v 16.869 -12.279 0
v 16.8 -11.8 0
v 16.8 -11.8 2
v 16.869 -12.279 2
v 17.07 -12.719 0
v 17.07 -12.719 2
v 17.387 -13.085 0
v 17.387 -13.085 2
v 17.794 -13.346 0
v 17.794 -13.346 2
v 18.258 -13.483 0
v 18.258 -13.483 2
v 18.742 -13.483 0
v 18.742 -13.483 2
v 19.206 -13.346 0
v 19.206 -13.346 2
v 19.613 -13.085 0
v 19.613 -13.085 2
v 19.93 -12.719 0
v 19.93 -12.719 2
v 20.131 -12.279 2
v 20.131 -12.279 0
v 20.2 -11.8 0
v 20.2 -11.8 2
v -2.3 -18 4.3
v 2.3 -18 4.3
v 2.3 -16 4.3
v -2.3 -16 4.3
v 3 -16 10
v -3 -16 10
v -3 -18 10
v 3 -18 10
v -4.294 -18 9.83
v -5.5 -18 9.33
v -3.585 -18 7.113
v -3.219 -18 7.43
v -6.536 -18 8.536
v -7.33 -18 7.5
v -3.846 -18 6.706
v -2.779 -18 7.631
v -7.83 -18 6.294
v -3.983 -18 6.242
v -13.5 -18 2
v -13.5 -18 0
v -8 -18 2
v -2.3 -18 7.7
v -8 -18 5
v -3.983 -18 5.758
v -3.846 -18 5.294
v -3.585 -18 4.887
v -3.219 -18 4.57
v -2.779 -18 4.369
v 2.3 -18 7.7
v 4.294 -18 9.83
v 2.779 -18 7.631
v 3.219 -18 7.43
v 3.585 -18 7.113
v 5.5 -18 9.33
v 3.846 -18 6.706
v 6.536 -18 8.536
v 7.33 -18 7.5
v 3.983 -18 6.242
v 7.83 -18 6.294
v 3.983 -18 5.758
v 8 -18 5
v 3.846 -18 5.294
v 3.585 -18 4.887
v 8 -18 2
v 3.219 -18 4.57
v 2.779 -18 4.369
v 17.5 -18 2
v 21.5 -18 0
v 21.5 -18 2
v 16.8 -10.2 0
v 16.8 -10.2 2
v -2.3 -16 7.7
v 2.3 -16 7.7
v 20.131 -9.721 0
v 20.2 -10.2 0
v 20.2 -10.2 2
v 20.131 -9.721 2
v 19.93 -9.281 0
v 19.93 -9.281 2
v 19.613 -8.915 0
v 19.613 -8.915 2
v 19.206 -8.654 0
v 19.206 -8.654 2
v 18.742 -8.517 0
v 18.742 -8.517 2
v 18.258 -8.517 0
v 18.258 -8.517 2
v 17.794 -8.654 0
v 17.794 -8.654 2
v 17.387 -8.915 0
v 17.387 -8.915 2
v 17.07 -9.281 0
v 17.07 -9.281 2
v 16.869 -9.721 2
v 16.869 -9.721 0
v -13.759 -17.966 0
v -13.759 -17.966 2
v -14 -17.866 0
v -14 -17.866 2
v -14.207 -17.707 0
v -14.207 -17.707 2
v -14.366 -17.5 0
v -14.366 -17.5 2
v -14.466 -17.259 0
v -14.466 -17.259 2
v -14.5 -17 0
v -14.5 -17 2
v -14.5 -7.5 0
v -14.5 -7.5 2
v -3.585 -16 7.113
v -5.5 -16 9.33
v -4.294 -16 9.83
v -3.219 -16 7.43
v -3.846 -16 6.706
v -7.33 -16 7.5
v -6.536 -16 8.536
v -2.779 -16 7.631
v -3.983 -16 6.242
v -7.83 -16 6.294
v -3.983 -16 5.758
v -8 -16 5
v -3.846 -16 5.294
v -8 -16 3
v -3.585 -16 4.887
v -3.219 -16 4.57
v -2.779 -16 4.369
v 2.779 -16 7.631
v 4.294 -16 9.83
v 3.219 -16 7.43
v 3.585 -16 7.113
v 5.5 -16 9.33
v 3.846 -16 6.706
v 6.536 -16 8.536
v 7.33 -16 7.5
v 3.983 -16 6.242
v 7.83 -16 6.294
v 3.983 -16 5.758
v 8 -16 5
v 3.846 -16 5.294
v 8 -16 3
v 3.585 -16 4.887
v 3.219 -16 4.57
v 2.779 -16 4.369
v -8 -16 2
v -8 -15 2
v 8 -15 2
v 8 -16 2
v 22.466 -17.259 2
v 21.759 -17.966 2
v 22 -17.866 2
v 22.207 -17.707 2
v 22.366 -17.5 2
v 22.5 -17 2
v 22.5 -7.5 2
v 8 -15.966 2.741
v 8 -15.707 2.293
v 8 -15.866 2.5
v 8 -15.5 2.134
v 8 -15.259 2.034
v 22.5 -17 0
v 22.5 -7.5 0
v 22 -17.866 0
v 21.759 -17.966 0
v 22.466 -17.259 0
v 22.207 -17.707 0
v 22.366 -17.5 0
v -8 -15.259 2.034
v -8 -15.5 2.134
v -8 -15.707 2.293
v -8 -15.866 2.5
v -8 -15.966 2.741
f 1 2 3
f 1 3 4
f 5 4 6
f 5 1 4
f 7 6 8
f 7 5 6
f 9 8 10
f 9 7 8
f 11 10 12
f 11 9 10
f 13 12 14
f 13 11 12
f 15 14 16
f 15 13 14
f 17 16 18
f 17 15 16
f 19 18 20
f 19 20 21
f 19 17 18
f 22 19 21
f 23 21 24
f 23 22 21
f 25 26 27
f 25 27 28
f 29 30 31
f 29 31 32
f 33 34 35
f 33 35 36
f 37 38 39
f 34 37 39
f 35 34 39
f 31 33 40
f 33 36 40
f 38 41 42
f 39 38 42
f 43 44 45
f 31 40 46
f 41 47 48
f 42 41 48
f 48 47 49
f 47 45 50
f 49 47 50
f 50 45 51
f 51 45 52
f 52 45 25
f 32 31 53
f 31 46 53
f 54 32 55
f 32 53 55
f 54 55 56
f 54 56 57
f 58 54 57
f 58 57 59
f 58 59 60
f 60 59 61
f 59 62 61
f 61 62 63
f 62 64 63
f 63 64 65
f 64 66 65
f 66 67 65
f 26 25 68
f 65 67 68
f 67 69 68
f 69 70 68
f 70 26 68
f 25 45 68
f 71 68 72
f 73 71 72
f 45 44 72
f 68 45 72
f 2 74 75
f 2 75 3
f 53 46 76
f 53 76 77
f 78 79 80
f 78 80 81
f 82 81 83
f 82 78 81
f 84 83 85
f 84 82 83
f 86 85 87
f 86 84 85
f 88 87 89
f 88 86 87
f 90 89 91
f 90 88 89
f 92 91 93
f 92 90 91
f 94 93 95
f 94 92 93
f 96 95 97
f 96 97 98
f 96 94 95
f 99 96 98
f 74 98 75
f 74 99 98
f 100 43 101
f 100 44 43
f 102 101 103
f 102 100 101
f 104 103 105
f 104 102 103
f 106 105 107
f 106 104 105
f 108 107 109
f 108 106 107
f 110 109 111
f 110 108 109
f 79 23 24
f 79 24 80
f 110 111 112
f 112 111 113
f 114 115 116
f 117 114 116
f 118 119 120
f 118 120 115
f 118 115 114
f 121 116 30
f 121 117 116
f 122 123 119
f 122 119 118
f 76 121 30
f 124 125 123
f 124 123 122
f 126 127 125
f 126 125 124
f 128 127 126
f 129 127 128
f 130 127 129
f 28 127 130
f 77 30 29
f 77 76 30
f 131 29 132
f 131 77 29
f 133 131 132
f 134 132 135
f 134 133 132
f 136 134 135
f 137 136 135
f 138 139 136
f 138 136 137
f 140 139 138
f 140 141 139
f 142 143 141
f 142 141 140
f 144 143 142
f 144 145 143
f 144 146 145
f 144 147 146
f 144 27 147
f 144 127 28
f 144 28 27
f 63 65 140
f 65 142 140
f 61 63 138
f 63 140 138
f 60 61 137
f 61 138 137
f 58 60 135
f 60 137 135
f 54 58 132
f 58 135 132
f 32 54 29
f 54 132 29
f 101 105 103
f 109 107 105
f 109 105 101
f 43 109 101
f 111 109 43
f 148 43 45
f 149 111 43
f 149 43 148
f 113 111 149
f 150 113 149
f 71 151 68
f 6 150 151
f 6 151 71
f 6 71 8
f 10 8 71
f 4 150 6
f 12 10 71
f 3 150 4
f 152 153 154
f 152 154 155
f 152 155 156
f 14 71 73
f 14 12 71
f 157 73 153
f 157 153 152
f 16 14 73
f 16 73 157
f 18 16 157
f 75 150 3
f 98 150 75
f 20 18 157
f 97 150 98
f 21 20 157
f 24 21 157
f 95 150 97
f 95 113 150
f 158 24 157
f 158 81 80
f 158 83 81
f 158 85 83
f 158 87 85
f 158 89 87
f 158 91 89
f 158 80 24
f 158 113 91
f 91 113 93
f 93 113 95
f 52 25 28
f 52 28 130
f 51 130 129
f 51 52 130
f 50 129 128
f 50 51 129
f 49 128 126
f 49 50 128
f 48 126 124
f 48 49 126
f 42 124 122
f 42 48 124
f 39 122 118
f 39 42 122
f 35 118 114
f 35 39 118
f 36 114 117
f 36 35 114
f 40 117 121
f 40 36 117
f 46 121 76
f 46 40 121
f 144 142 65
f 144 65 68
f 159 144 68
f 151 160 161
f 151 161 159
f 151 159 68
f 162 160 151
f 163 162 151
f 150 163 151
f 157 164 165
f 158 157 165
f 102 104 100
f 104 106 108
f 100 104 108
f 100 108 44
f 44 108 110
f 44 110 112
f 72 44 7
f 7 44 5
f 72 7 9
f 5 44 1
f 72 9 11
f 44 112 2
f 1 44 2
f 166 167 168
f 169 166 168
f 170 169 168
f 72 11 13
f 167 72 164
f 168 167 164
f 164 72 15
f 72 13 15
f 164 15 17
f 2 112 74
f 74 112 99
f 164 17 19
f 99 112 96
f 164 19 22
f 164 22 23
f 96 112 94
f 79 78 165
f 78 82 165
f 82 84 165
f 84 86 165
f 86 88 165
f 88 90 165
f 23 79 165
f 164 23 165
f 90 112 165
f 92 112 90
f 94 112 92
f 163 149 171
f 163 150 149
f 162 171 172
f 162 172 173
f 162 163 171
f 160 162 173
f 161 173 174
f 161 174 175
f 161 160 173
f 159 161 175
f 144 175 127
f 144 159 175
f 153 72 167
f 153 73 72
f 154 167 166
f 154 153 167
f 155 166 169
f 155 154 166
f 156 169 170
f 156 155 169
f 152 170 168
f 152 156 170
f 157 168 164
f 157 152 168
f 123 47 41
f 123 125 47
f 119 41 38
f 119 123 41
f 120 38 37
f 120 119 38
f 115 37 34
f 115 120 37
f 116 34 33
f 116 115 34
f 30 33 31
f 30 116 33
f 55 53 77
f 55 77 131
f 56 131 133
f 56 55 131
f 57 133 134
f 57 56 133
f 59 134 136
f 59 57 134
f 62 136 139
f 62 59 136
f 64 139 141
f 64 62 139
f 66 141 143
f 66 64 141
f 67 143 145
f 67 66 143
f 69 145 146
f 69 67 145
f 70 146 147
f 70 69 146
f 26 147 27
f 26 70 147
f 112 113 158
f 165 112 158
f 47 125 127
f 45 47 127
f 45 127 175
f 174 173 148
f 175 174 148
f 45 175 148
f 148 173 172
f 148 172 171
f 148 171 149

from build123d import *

# Parameters (mm, degrees)
SKETCH_1_W             = 45
SKETCH_1_H             = 10
EXTRUDE_1_DEPTH        = 2
SKETCH_2_W             = 45
SKETCH_2_H             = 23
EXTRUDE_2_DEPTH        = 2
SKETCH_4_W             = 45
SKETCH_4_H             = 2
EXTRUDE_3_DEPTH        = 10
HOLE_START             = -18
HOLE_WIZARD_M3_9_DEPTH = 2
HOLE_WIZARD_M3_1_DEPTH = 2
SKETCH_9_W             = 8
SKETCH_9_H             = 2
CUT_EXTRUDE_1_DEPTH    = 30.904013109
FILLET_2_R             = 3
SKETCH_10_W            = 45
SKETCH_10_H            = 7
CUT_EXTRUDE_2_DEPTH    = 10
SKETCH_11_W            = 45
SKETCH_11_H            = 16
EXTRUDE_4_DEPTH        = 2
HOLE_WIZARD_M3_5_DEPTH = 2
SKETCH_14_W            = 12.097238659
SKETCH_14_H            = 15.369634007
CUT_EXTRUDE_3_DEPTH    = 29.324018077
SKETCH_15_W            = 45
SKETCH_15_H            = 3
CUT_EXTRUDE_4_DEPTH    = 10
FILLET_8_R             = 5
FILLET_9_R             = 1
CUT_EXTRUDE_6_REACH    = 31.904
SKETCH_21_W            = 8
SKETCH_21_H            = 13
FILLET_10_R            = 1
CUT_EXTRUDE_8_REACH    = 31.904
SKETCH_23_W            = 44.634703277
SKETCH_23_H            = 2.5


# Read off the part's stored shape, not the designer's step: M3 间隙槽口9, M3 间隙槽口1, M3 间隙槽口5
with BuildPart() as part:
    # 草图1 → 凸台-拉伸1 (new body)
    with BuildSketch(Plane.XY):
        Rectangle(SKETCH_1_W, SKETCH_1_H)
    extrude(amount=EXTRUDE_1_DEPTH)

    # 草图2 → 凸台-拉伸2 (add)
    with BuildSketch(Plane.XY):
        with Locations((0, -6.5)):
            Rectangle(SKETCH_2_W, SKETCH_2_H)
    extrude(amount=EXTRUDE_2_DEPTH)

    # 草图4 → 凸台-拉伸3 (add)
    with BuildSketch(Plane.XY):
        with Locations((0, -17)):
            Rectangle(SKETCH_4_W, SKETCH_4_H)
    extrude(amount=EXTRUDE_3_DEPTH)

    # M3 间隙槽口9 outline → M3 间隙槽口9 (cut)
    with BuildSketch(Plane(origin=(0, 0, 0), x_dir=(1, 0, 0), z_dir=(0, 1, 0)).offset(HOLE_START)):
        with BuildLine():
            Line((-2.3, -7.7), (2.3, -7.7))
            ThreePointArc((2.3, -7.7), (4, -6), (2.3, -4.3))
            Line((2.3, -4.3), (-2.3, -4.3))
            ThreePointArc((-2.3, -4.3), (-4, -6), (-2.3, -7.7))
        make_face()
    extrude(amount=HOLE_WIZARD_M3_9_DEPTH, mode=Mode.SUBTRACT)

    # M3 间隙槽口1 outline → M3 间隙槽口1 (cut)
    with BuildSketch(Plane.XY):
        with BuildLine():
            ThreePointArc((20.2, 1.3), (18.5, 3), (16.8, 1.3))
            Line((16.8, 1.3), (16.8, -13.3))
            ThreePointArc((16.8, -13.3), (18.5, -15), (20.2, -13.3))
            Line((20.2, -13.3), (20.2, 1.3))
        make_face()
        with BuildLine():
            ThreePointArc((-16.8, 1.3), (-18.5, 3), (-20.2, 1.3))
            Line((-20.2, 1.3), (-20.2, -13.3))
            ThreePointArc((-20.2, -13.3), (-18.5, -15), (-16.8, -13.3))
            Line((-16.8, -13.3), (-16.8, 1.3))
        make_face()
    extrude(amount=HOLE_WIZARD_M3_1_DEPTH, mode=Mode.SUBTRACT)

    # 草图9 → 切除-拉伸1 (cut, through all)
    with BuildSketch(Plane.XY.offset(2)):
        with Locations((-18.5, -17)):
            Rectangle(SKETCH_9_W, SKETCH_9_H)
        with Locations((18.5, -17)):
            Rectangle(SKETCH_9_W, SKETCH_9_H)
    extrude(amount=CUT_EXTRUDE_1_DEPTH, mode=Mode.SUBTRACT)

    # 圆角2
    fillet_2_edges = [part.edges().sort_by_distance(p)[0] for p in [
        (-14.5, -17, 2),
        (14.5, -17, 2),
    ]]
    fillet(fillet_2_edges, radius=FILLET_2_R)

    # 草图10 → 切除-拉伸2 (cut)
    with BuildSketch(Plane.XY.offset(2)):
        with Locations((0, 1.5)):
            Rectangle(SKETCH_10_W, SKETCH_10_H)
    extrude(amount=-CUT_EXTRUDE_2_DEPTH, mode=Mode.SUBTRACT)

    # 草图11 → 凸台-拉伸4 (add)
    with BuildSketch(Plane.XY.offset(2)):
        with Locations((0, -10)):
            Rectangle(SKETCH_11_W, SKETCH_11_H)
    extrude(amount=-EXTRUDE_4_DEPTH)

    # M3 间隙槽口5 outline → M3 间隙槽口5 (cut)
    with BuildSketch(Plane.XY):
        with BuildLine():
            Line((16.8, -10.2), (16.8, -11.8))
            ThreePointArc((16.8, -11.8), (18.5, -13.5), (20.2, -11.8))
            Line((20.2, -11.8), (20.2, -10.2))
            ThreePointArc((20.2, -10.2), (18.5, -8.5), (16.8, -10.2))
        make_face()
        with BuildLine():
            Line((-20.2, -10.2), (-20.2, -11.8))
            ThreePointArc((-20.2, -11.8), (-18.5, -13.5), (-16.8, -11.8))
            Line((-16.8, -11.8), (-16.8, -10.2))
            ThreePointArc((-16.8, -10.2), (-18.5, -8.5), (-20.2, -10.2))
        make_face()
    extrude(amount=HOLE_WIZARD_M3_5_DEPTH, mode=Mode.SUBTRACT)

    # 草图14 → 切除-拉伸3 (cut, through all)
    with BuildSketch(Plane(origin=(0, -16, 0), x_dir=(1, 0, 0), z_dir=(0, 1, 0))):
        with Locations((-14.04861933, -9.684817004)):
            Rectangle(SKETCH_14_W, SKETCH_14_H)
        with Locations((14.04861933, -9.684817004)):
            Rectangle(SKETCH_14_W, SKETCH_14_H)
    extrude(amount=-CUT_EXTRUDE_3_DEPTH, mode=Mode.SUBTRACT)

    # 草图15 → 切除-拉伸4 (cut)
    with BuildSketch(Plane.XY.offset(2)):
        with Locations((0, -3.5)):
            Rectangle(SKETCH_15_W, SKETCH_15_H)
    extrude(amount=-CUT_EXTRUDE_4_DEPTH, mode=Mode.SUBTRACT)

    # 圆角8
    fillet_8_edges = [part.edges().sort_by_distance(p)[0] for p in [
        (8, -17, 10),
        (-8, -17, 10),
    ]]
    fillet(fillet_8_edges, radius=FILLET_8_R)

    # 圆角9
    fillet_9_edges = [part.edges().sort_by_distance(p)[0] for p in [
        (0, -16, 2),
    ]]
    fillet(fillet_9_edges, radius=FILLET_9_R)

    # 草图21 → 切除-拉伸6 (cut, up to next)
    with BuildSketch(Plane.XY.offset(2), mode=Mode.PRIVATE) as cut_extrude_6_sk1:
        with Locations((-18.5, -11.5)):
            Rectangle(SKETCH_21_W, SKETCH_21_H)
    cut_extrude_6_tool1 = extrude(cut_extrude_6_sk1.sketch, amount=-CUT_EXTRUDE_6_REACH, mode=Mode.PRIVATE) & part.part
    add(cut_extrude_6_tool1.solids().sort_by_distance((-18.5, -11.5, 2))[0], mode=Mode.SUBTRACT)

    # 圆角10
    fillet_10_edges = [part.edges().sort_by_distance(p)[0] for p in [
        (22.5, -18, 1),
        (22.5, -5, 1),
        (-14.5, -5, 1),
        (-14.5, -18, 1),
    ]]
    fillet(fillet_10_edges, radius=FILLET_10_R)

    # 草图23 → 切除-拉伸8 (cut, up to next)
    with BuildSketch(Plane.XY.offset(2), mode=Mode.PRIVATE) as cut_extrude_8_sk1:
        with Locations((0.182648362, -6.25)):
            Rectangle(SKETCH_23_W, SKETCH_23_H)
    cut_extrude_8_tool1 = extrude(cut_extrude_8_sk1.sketch, amount=-CUT_EXTRUDE_8_REACH, mode=Mode.PRIVATE) & part.part
    add(cut_extrude_8_tool1.solids().sort_by_distance((0.182648, -6.25, 2))[0], mode=Mode.SUBTRACT)


solid = part.part
